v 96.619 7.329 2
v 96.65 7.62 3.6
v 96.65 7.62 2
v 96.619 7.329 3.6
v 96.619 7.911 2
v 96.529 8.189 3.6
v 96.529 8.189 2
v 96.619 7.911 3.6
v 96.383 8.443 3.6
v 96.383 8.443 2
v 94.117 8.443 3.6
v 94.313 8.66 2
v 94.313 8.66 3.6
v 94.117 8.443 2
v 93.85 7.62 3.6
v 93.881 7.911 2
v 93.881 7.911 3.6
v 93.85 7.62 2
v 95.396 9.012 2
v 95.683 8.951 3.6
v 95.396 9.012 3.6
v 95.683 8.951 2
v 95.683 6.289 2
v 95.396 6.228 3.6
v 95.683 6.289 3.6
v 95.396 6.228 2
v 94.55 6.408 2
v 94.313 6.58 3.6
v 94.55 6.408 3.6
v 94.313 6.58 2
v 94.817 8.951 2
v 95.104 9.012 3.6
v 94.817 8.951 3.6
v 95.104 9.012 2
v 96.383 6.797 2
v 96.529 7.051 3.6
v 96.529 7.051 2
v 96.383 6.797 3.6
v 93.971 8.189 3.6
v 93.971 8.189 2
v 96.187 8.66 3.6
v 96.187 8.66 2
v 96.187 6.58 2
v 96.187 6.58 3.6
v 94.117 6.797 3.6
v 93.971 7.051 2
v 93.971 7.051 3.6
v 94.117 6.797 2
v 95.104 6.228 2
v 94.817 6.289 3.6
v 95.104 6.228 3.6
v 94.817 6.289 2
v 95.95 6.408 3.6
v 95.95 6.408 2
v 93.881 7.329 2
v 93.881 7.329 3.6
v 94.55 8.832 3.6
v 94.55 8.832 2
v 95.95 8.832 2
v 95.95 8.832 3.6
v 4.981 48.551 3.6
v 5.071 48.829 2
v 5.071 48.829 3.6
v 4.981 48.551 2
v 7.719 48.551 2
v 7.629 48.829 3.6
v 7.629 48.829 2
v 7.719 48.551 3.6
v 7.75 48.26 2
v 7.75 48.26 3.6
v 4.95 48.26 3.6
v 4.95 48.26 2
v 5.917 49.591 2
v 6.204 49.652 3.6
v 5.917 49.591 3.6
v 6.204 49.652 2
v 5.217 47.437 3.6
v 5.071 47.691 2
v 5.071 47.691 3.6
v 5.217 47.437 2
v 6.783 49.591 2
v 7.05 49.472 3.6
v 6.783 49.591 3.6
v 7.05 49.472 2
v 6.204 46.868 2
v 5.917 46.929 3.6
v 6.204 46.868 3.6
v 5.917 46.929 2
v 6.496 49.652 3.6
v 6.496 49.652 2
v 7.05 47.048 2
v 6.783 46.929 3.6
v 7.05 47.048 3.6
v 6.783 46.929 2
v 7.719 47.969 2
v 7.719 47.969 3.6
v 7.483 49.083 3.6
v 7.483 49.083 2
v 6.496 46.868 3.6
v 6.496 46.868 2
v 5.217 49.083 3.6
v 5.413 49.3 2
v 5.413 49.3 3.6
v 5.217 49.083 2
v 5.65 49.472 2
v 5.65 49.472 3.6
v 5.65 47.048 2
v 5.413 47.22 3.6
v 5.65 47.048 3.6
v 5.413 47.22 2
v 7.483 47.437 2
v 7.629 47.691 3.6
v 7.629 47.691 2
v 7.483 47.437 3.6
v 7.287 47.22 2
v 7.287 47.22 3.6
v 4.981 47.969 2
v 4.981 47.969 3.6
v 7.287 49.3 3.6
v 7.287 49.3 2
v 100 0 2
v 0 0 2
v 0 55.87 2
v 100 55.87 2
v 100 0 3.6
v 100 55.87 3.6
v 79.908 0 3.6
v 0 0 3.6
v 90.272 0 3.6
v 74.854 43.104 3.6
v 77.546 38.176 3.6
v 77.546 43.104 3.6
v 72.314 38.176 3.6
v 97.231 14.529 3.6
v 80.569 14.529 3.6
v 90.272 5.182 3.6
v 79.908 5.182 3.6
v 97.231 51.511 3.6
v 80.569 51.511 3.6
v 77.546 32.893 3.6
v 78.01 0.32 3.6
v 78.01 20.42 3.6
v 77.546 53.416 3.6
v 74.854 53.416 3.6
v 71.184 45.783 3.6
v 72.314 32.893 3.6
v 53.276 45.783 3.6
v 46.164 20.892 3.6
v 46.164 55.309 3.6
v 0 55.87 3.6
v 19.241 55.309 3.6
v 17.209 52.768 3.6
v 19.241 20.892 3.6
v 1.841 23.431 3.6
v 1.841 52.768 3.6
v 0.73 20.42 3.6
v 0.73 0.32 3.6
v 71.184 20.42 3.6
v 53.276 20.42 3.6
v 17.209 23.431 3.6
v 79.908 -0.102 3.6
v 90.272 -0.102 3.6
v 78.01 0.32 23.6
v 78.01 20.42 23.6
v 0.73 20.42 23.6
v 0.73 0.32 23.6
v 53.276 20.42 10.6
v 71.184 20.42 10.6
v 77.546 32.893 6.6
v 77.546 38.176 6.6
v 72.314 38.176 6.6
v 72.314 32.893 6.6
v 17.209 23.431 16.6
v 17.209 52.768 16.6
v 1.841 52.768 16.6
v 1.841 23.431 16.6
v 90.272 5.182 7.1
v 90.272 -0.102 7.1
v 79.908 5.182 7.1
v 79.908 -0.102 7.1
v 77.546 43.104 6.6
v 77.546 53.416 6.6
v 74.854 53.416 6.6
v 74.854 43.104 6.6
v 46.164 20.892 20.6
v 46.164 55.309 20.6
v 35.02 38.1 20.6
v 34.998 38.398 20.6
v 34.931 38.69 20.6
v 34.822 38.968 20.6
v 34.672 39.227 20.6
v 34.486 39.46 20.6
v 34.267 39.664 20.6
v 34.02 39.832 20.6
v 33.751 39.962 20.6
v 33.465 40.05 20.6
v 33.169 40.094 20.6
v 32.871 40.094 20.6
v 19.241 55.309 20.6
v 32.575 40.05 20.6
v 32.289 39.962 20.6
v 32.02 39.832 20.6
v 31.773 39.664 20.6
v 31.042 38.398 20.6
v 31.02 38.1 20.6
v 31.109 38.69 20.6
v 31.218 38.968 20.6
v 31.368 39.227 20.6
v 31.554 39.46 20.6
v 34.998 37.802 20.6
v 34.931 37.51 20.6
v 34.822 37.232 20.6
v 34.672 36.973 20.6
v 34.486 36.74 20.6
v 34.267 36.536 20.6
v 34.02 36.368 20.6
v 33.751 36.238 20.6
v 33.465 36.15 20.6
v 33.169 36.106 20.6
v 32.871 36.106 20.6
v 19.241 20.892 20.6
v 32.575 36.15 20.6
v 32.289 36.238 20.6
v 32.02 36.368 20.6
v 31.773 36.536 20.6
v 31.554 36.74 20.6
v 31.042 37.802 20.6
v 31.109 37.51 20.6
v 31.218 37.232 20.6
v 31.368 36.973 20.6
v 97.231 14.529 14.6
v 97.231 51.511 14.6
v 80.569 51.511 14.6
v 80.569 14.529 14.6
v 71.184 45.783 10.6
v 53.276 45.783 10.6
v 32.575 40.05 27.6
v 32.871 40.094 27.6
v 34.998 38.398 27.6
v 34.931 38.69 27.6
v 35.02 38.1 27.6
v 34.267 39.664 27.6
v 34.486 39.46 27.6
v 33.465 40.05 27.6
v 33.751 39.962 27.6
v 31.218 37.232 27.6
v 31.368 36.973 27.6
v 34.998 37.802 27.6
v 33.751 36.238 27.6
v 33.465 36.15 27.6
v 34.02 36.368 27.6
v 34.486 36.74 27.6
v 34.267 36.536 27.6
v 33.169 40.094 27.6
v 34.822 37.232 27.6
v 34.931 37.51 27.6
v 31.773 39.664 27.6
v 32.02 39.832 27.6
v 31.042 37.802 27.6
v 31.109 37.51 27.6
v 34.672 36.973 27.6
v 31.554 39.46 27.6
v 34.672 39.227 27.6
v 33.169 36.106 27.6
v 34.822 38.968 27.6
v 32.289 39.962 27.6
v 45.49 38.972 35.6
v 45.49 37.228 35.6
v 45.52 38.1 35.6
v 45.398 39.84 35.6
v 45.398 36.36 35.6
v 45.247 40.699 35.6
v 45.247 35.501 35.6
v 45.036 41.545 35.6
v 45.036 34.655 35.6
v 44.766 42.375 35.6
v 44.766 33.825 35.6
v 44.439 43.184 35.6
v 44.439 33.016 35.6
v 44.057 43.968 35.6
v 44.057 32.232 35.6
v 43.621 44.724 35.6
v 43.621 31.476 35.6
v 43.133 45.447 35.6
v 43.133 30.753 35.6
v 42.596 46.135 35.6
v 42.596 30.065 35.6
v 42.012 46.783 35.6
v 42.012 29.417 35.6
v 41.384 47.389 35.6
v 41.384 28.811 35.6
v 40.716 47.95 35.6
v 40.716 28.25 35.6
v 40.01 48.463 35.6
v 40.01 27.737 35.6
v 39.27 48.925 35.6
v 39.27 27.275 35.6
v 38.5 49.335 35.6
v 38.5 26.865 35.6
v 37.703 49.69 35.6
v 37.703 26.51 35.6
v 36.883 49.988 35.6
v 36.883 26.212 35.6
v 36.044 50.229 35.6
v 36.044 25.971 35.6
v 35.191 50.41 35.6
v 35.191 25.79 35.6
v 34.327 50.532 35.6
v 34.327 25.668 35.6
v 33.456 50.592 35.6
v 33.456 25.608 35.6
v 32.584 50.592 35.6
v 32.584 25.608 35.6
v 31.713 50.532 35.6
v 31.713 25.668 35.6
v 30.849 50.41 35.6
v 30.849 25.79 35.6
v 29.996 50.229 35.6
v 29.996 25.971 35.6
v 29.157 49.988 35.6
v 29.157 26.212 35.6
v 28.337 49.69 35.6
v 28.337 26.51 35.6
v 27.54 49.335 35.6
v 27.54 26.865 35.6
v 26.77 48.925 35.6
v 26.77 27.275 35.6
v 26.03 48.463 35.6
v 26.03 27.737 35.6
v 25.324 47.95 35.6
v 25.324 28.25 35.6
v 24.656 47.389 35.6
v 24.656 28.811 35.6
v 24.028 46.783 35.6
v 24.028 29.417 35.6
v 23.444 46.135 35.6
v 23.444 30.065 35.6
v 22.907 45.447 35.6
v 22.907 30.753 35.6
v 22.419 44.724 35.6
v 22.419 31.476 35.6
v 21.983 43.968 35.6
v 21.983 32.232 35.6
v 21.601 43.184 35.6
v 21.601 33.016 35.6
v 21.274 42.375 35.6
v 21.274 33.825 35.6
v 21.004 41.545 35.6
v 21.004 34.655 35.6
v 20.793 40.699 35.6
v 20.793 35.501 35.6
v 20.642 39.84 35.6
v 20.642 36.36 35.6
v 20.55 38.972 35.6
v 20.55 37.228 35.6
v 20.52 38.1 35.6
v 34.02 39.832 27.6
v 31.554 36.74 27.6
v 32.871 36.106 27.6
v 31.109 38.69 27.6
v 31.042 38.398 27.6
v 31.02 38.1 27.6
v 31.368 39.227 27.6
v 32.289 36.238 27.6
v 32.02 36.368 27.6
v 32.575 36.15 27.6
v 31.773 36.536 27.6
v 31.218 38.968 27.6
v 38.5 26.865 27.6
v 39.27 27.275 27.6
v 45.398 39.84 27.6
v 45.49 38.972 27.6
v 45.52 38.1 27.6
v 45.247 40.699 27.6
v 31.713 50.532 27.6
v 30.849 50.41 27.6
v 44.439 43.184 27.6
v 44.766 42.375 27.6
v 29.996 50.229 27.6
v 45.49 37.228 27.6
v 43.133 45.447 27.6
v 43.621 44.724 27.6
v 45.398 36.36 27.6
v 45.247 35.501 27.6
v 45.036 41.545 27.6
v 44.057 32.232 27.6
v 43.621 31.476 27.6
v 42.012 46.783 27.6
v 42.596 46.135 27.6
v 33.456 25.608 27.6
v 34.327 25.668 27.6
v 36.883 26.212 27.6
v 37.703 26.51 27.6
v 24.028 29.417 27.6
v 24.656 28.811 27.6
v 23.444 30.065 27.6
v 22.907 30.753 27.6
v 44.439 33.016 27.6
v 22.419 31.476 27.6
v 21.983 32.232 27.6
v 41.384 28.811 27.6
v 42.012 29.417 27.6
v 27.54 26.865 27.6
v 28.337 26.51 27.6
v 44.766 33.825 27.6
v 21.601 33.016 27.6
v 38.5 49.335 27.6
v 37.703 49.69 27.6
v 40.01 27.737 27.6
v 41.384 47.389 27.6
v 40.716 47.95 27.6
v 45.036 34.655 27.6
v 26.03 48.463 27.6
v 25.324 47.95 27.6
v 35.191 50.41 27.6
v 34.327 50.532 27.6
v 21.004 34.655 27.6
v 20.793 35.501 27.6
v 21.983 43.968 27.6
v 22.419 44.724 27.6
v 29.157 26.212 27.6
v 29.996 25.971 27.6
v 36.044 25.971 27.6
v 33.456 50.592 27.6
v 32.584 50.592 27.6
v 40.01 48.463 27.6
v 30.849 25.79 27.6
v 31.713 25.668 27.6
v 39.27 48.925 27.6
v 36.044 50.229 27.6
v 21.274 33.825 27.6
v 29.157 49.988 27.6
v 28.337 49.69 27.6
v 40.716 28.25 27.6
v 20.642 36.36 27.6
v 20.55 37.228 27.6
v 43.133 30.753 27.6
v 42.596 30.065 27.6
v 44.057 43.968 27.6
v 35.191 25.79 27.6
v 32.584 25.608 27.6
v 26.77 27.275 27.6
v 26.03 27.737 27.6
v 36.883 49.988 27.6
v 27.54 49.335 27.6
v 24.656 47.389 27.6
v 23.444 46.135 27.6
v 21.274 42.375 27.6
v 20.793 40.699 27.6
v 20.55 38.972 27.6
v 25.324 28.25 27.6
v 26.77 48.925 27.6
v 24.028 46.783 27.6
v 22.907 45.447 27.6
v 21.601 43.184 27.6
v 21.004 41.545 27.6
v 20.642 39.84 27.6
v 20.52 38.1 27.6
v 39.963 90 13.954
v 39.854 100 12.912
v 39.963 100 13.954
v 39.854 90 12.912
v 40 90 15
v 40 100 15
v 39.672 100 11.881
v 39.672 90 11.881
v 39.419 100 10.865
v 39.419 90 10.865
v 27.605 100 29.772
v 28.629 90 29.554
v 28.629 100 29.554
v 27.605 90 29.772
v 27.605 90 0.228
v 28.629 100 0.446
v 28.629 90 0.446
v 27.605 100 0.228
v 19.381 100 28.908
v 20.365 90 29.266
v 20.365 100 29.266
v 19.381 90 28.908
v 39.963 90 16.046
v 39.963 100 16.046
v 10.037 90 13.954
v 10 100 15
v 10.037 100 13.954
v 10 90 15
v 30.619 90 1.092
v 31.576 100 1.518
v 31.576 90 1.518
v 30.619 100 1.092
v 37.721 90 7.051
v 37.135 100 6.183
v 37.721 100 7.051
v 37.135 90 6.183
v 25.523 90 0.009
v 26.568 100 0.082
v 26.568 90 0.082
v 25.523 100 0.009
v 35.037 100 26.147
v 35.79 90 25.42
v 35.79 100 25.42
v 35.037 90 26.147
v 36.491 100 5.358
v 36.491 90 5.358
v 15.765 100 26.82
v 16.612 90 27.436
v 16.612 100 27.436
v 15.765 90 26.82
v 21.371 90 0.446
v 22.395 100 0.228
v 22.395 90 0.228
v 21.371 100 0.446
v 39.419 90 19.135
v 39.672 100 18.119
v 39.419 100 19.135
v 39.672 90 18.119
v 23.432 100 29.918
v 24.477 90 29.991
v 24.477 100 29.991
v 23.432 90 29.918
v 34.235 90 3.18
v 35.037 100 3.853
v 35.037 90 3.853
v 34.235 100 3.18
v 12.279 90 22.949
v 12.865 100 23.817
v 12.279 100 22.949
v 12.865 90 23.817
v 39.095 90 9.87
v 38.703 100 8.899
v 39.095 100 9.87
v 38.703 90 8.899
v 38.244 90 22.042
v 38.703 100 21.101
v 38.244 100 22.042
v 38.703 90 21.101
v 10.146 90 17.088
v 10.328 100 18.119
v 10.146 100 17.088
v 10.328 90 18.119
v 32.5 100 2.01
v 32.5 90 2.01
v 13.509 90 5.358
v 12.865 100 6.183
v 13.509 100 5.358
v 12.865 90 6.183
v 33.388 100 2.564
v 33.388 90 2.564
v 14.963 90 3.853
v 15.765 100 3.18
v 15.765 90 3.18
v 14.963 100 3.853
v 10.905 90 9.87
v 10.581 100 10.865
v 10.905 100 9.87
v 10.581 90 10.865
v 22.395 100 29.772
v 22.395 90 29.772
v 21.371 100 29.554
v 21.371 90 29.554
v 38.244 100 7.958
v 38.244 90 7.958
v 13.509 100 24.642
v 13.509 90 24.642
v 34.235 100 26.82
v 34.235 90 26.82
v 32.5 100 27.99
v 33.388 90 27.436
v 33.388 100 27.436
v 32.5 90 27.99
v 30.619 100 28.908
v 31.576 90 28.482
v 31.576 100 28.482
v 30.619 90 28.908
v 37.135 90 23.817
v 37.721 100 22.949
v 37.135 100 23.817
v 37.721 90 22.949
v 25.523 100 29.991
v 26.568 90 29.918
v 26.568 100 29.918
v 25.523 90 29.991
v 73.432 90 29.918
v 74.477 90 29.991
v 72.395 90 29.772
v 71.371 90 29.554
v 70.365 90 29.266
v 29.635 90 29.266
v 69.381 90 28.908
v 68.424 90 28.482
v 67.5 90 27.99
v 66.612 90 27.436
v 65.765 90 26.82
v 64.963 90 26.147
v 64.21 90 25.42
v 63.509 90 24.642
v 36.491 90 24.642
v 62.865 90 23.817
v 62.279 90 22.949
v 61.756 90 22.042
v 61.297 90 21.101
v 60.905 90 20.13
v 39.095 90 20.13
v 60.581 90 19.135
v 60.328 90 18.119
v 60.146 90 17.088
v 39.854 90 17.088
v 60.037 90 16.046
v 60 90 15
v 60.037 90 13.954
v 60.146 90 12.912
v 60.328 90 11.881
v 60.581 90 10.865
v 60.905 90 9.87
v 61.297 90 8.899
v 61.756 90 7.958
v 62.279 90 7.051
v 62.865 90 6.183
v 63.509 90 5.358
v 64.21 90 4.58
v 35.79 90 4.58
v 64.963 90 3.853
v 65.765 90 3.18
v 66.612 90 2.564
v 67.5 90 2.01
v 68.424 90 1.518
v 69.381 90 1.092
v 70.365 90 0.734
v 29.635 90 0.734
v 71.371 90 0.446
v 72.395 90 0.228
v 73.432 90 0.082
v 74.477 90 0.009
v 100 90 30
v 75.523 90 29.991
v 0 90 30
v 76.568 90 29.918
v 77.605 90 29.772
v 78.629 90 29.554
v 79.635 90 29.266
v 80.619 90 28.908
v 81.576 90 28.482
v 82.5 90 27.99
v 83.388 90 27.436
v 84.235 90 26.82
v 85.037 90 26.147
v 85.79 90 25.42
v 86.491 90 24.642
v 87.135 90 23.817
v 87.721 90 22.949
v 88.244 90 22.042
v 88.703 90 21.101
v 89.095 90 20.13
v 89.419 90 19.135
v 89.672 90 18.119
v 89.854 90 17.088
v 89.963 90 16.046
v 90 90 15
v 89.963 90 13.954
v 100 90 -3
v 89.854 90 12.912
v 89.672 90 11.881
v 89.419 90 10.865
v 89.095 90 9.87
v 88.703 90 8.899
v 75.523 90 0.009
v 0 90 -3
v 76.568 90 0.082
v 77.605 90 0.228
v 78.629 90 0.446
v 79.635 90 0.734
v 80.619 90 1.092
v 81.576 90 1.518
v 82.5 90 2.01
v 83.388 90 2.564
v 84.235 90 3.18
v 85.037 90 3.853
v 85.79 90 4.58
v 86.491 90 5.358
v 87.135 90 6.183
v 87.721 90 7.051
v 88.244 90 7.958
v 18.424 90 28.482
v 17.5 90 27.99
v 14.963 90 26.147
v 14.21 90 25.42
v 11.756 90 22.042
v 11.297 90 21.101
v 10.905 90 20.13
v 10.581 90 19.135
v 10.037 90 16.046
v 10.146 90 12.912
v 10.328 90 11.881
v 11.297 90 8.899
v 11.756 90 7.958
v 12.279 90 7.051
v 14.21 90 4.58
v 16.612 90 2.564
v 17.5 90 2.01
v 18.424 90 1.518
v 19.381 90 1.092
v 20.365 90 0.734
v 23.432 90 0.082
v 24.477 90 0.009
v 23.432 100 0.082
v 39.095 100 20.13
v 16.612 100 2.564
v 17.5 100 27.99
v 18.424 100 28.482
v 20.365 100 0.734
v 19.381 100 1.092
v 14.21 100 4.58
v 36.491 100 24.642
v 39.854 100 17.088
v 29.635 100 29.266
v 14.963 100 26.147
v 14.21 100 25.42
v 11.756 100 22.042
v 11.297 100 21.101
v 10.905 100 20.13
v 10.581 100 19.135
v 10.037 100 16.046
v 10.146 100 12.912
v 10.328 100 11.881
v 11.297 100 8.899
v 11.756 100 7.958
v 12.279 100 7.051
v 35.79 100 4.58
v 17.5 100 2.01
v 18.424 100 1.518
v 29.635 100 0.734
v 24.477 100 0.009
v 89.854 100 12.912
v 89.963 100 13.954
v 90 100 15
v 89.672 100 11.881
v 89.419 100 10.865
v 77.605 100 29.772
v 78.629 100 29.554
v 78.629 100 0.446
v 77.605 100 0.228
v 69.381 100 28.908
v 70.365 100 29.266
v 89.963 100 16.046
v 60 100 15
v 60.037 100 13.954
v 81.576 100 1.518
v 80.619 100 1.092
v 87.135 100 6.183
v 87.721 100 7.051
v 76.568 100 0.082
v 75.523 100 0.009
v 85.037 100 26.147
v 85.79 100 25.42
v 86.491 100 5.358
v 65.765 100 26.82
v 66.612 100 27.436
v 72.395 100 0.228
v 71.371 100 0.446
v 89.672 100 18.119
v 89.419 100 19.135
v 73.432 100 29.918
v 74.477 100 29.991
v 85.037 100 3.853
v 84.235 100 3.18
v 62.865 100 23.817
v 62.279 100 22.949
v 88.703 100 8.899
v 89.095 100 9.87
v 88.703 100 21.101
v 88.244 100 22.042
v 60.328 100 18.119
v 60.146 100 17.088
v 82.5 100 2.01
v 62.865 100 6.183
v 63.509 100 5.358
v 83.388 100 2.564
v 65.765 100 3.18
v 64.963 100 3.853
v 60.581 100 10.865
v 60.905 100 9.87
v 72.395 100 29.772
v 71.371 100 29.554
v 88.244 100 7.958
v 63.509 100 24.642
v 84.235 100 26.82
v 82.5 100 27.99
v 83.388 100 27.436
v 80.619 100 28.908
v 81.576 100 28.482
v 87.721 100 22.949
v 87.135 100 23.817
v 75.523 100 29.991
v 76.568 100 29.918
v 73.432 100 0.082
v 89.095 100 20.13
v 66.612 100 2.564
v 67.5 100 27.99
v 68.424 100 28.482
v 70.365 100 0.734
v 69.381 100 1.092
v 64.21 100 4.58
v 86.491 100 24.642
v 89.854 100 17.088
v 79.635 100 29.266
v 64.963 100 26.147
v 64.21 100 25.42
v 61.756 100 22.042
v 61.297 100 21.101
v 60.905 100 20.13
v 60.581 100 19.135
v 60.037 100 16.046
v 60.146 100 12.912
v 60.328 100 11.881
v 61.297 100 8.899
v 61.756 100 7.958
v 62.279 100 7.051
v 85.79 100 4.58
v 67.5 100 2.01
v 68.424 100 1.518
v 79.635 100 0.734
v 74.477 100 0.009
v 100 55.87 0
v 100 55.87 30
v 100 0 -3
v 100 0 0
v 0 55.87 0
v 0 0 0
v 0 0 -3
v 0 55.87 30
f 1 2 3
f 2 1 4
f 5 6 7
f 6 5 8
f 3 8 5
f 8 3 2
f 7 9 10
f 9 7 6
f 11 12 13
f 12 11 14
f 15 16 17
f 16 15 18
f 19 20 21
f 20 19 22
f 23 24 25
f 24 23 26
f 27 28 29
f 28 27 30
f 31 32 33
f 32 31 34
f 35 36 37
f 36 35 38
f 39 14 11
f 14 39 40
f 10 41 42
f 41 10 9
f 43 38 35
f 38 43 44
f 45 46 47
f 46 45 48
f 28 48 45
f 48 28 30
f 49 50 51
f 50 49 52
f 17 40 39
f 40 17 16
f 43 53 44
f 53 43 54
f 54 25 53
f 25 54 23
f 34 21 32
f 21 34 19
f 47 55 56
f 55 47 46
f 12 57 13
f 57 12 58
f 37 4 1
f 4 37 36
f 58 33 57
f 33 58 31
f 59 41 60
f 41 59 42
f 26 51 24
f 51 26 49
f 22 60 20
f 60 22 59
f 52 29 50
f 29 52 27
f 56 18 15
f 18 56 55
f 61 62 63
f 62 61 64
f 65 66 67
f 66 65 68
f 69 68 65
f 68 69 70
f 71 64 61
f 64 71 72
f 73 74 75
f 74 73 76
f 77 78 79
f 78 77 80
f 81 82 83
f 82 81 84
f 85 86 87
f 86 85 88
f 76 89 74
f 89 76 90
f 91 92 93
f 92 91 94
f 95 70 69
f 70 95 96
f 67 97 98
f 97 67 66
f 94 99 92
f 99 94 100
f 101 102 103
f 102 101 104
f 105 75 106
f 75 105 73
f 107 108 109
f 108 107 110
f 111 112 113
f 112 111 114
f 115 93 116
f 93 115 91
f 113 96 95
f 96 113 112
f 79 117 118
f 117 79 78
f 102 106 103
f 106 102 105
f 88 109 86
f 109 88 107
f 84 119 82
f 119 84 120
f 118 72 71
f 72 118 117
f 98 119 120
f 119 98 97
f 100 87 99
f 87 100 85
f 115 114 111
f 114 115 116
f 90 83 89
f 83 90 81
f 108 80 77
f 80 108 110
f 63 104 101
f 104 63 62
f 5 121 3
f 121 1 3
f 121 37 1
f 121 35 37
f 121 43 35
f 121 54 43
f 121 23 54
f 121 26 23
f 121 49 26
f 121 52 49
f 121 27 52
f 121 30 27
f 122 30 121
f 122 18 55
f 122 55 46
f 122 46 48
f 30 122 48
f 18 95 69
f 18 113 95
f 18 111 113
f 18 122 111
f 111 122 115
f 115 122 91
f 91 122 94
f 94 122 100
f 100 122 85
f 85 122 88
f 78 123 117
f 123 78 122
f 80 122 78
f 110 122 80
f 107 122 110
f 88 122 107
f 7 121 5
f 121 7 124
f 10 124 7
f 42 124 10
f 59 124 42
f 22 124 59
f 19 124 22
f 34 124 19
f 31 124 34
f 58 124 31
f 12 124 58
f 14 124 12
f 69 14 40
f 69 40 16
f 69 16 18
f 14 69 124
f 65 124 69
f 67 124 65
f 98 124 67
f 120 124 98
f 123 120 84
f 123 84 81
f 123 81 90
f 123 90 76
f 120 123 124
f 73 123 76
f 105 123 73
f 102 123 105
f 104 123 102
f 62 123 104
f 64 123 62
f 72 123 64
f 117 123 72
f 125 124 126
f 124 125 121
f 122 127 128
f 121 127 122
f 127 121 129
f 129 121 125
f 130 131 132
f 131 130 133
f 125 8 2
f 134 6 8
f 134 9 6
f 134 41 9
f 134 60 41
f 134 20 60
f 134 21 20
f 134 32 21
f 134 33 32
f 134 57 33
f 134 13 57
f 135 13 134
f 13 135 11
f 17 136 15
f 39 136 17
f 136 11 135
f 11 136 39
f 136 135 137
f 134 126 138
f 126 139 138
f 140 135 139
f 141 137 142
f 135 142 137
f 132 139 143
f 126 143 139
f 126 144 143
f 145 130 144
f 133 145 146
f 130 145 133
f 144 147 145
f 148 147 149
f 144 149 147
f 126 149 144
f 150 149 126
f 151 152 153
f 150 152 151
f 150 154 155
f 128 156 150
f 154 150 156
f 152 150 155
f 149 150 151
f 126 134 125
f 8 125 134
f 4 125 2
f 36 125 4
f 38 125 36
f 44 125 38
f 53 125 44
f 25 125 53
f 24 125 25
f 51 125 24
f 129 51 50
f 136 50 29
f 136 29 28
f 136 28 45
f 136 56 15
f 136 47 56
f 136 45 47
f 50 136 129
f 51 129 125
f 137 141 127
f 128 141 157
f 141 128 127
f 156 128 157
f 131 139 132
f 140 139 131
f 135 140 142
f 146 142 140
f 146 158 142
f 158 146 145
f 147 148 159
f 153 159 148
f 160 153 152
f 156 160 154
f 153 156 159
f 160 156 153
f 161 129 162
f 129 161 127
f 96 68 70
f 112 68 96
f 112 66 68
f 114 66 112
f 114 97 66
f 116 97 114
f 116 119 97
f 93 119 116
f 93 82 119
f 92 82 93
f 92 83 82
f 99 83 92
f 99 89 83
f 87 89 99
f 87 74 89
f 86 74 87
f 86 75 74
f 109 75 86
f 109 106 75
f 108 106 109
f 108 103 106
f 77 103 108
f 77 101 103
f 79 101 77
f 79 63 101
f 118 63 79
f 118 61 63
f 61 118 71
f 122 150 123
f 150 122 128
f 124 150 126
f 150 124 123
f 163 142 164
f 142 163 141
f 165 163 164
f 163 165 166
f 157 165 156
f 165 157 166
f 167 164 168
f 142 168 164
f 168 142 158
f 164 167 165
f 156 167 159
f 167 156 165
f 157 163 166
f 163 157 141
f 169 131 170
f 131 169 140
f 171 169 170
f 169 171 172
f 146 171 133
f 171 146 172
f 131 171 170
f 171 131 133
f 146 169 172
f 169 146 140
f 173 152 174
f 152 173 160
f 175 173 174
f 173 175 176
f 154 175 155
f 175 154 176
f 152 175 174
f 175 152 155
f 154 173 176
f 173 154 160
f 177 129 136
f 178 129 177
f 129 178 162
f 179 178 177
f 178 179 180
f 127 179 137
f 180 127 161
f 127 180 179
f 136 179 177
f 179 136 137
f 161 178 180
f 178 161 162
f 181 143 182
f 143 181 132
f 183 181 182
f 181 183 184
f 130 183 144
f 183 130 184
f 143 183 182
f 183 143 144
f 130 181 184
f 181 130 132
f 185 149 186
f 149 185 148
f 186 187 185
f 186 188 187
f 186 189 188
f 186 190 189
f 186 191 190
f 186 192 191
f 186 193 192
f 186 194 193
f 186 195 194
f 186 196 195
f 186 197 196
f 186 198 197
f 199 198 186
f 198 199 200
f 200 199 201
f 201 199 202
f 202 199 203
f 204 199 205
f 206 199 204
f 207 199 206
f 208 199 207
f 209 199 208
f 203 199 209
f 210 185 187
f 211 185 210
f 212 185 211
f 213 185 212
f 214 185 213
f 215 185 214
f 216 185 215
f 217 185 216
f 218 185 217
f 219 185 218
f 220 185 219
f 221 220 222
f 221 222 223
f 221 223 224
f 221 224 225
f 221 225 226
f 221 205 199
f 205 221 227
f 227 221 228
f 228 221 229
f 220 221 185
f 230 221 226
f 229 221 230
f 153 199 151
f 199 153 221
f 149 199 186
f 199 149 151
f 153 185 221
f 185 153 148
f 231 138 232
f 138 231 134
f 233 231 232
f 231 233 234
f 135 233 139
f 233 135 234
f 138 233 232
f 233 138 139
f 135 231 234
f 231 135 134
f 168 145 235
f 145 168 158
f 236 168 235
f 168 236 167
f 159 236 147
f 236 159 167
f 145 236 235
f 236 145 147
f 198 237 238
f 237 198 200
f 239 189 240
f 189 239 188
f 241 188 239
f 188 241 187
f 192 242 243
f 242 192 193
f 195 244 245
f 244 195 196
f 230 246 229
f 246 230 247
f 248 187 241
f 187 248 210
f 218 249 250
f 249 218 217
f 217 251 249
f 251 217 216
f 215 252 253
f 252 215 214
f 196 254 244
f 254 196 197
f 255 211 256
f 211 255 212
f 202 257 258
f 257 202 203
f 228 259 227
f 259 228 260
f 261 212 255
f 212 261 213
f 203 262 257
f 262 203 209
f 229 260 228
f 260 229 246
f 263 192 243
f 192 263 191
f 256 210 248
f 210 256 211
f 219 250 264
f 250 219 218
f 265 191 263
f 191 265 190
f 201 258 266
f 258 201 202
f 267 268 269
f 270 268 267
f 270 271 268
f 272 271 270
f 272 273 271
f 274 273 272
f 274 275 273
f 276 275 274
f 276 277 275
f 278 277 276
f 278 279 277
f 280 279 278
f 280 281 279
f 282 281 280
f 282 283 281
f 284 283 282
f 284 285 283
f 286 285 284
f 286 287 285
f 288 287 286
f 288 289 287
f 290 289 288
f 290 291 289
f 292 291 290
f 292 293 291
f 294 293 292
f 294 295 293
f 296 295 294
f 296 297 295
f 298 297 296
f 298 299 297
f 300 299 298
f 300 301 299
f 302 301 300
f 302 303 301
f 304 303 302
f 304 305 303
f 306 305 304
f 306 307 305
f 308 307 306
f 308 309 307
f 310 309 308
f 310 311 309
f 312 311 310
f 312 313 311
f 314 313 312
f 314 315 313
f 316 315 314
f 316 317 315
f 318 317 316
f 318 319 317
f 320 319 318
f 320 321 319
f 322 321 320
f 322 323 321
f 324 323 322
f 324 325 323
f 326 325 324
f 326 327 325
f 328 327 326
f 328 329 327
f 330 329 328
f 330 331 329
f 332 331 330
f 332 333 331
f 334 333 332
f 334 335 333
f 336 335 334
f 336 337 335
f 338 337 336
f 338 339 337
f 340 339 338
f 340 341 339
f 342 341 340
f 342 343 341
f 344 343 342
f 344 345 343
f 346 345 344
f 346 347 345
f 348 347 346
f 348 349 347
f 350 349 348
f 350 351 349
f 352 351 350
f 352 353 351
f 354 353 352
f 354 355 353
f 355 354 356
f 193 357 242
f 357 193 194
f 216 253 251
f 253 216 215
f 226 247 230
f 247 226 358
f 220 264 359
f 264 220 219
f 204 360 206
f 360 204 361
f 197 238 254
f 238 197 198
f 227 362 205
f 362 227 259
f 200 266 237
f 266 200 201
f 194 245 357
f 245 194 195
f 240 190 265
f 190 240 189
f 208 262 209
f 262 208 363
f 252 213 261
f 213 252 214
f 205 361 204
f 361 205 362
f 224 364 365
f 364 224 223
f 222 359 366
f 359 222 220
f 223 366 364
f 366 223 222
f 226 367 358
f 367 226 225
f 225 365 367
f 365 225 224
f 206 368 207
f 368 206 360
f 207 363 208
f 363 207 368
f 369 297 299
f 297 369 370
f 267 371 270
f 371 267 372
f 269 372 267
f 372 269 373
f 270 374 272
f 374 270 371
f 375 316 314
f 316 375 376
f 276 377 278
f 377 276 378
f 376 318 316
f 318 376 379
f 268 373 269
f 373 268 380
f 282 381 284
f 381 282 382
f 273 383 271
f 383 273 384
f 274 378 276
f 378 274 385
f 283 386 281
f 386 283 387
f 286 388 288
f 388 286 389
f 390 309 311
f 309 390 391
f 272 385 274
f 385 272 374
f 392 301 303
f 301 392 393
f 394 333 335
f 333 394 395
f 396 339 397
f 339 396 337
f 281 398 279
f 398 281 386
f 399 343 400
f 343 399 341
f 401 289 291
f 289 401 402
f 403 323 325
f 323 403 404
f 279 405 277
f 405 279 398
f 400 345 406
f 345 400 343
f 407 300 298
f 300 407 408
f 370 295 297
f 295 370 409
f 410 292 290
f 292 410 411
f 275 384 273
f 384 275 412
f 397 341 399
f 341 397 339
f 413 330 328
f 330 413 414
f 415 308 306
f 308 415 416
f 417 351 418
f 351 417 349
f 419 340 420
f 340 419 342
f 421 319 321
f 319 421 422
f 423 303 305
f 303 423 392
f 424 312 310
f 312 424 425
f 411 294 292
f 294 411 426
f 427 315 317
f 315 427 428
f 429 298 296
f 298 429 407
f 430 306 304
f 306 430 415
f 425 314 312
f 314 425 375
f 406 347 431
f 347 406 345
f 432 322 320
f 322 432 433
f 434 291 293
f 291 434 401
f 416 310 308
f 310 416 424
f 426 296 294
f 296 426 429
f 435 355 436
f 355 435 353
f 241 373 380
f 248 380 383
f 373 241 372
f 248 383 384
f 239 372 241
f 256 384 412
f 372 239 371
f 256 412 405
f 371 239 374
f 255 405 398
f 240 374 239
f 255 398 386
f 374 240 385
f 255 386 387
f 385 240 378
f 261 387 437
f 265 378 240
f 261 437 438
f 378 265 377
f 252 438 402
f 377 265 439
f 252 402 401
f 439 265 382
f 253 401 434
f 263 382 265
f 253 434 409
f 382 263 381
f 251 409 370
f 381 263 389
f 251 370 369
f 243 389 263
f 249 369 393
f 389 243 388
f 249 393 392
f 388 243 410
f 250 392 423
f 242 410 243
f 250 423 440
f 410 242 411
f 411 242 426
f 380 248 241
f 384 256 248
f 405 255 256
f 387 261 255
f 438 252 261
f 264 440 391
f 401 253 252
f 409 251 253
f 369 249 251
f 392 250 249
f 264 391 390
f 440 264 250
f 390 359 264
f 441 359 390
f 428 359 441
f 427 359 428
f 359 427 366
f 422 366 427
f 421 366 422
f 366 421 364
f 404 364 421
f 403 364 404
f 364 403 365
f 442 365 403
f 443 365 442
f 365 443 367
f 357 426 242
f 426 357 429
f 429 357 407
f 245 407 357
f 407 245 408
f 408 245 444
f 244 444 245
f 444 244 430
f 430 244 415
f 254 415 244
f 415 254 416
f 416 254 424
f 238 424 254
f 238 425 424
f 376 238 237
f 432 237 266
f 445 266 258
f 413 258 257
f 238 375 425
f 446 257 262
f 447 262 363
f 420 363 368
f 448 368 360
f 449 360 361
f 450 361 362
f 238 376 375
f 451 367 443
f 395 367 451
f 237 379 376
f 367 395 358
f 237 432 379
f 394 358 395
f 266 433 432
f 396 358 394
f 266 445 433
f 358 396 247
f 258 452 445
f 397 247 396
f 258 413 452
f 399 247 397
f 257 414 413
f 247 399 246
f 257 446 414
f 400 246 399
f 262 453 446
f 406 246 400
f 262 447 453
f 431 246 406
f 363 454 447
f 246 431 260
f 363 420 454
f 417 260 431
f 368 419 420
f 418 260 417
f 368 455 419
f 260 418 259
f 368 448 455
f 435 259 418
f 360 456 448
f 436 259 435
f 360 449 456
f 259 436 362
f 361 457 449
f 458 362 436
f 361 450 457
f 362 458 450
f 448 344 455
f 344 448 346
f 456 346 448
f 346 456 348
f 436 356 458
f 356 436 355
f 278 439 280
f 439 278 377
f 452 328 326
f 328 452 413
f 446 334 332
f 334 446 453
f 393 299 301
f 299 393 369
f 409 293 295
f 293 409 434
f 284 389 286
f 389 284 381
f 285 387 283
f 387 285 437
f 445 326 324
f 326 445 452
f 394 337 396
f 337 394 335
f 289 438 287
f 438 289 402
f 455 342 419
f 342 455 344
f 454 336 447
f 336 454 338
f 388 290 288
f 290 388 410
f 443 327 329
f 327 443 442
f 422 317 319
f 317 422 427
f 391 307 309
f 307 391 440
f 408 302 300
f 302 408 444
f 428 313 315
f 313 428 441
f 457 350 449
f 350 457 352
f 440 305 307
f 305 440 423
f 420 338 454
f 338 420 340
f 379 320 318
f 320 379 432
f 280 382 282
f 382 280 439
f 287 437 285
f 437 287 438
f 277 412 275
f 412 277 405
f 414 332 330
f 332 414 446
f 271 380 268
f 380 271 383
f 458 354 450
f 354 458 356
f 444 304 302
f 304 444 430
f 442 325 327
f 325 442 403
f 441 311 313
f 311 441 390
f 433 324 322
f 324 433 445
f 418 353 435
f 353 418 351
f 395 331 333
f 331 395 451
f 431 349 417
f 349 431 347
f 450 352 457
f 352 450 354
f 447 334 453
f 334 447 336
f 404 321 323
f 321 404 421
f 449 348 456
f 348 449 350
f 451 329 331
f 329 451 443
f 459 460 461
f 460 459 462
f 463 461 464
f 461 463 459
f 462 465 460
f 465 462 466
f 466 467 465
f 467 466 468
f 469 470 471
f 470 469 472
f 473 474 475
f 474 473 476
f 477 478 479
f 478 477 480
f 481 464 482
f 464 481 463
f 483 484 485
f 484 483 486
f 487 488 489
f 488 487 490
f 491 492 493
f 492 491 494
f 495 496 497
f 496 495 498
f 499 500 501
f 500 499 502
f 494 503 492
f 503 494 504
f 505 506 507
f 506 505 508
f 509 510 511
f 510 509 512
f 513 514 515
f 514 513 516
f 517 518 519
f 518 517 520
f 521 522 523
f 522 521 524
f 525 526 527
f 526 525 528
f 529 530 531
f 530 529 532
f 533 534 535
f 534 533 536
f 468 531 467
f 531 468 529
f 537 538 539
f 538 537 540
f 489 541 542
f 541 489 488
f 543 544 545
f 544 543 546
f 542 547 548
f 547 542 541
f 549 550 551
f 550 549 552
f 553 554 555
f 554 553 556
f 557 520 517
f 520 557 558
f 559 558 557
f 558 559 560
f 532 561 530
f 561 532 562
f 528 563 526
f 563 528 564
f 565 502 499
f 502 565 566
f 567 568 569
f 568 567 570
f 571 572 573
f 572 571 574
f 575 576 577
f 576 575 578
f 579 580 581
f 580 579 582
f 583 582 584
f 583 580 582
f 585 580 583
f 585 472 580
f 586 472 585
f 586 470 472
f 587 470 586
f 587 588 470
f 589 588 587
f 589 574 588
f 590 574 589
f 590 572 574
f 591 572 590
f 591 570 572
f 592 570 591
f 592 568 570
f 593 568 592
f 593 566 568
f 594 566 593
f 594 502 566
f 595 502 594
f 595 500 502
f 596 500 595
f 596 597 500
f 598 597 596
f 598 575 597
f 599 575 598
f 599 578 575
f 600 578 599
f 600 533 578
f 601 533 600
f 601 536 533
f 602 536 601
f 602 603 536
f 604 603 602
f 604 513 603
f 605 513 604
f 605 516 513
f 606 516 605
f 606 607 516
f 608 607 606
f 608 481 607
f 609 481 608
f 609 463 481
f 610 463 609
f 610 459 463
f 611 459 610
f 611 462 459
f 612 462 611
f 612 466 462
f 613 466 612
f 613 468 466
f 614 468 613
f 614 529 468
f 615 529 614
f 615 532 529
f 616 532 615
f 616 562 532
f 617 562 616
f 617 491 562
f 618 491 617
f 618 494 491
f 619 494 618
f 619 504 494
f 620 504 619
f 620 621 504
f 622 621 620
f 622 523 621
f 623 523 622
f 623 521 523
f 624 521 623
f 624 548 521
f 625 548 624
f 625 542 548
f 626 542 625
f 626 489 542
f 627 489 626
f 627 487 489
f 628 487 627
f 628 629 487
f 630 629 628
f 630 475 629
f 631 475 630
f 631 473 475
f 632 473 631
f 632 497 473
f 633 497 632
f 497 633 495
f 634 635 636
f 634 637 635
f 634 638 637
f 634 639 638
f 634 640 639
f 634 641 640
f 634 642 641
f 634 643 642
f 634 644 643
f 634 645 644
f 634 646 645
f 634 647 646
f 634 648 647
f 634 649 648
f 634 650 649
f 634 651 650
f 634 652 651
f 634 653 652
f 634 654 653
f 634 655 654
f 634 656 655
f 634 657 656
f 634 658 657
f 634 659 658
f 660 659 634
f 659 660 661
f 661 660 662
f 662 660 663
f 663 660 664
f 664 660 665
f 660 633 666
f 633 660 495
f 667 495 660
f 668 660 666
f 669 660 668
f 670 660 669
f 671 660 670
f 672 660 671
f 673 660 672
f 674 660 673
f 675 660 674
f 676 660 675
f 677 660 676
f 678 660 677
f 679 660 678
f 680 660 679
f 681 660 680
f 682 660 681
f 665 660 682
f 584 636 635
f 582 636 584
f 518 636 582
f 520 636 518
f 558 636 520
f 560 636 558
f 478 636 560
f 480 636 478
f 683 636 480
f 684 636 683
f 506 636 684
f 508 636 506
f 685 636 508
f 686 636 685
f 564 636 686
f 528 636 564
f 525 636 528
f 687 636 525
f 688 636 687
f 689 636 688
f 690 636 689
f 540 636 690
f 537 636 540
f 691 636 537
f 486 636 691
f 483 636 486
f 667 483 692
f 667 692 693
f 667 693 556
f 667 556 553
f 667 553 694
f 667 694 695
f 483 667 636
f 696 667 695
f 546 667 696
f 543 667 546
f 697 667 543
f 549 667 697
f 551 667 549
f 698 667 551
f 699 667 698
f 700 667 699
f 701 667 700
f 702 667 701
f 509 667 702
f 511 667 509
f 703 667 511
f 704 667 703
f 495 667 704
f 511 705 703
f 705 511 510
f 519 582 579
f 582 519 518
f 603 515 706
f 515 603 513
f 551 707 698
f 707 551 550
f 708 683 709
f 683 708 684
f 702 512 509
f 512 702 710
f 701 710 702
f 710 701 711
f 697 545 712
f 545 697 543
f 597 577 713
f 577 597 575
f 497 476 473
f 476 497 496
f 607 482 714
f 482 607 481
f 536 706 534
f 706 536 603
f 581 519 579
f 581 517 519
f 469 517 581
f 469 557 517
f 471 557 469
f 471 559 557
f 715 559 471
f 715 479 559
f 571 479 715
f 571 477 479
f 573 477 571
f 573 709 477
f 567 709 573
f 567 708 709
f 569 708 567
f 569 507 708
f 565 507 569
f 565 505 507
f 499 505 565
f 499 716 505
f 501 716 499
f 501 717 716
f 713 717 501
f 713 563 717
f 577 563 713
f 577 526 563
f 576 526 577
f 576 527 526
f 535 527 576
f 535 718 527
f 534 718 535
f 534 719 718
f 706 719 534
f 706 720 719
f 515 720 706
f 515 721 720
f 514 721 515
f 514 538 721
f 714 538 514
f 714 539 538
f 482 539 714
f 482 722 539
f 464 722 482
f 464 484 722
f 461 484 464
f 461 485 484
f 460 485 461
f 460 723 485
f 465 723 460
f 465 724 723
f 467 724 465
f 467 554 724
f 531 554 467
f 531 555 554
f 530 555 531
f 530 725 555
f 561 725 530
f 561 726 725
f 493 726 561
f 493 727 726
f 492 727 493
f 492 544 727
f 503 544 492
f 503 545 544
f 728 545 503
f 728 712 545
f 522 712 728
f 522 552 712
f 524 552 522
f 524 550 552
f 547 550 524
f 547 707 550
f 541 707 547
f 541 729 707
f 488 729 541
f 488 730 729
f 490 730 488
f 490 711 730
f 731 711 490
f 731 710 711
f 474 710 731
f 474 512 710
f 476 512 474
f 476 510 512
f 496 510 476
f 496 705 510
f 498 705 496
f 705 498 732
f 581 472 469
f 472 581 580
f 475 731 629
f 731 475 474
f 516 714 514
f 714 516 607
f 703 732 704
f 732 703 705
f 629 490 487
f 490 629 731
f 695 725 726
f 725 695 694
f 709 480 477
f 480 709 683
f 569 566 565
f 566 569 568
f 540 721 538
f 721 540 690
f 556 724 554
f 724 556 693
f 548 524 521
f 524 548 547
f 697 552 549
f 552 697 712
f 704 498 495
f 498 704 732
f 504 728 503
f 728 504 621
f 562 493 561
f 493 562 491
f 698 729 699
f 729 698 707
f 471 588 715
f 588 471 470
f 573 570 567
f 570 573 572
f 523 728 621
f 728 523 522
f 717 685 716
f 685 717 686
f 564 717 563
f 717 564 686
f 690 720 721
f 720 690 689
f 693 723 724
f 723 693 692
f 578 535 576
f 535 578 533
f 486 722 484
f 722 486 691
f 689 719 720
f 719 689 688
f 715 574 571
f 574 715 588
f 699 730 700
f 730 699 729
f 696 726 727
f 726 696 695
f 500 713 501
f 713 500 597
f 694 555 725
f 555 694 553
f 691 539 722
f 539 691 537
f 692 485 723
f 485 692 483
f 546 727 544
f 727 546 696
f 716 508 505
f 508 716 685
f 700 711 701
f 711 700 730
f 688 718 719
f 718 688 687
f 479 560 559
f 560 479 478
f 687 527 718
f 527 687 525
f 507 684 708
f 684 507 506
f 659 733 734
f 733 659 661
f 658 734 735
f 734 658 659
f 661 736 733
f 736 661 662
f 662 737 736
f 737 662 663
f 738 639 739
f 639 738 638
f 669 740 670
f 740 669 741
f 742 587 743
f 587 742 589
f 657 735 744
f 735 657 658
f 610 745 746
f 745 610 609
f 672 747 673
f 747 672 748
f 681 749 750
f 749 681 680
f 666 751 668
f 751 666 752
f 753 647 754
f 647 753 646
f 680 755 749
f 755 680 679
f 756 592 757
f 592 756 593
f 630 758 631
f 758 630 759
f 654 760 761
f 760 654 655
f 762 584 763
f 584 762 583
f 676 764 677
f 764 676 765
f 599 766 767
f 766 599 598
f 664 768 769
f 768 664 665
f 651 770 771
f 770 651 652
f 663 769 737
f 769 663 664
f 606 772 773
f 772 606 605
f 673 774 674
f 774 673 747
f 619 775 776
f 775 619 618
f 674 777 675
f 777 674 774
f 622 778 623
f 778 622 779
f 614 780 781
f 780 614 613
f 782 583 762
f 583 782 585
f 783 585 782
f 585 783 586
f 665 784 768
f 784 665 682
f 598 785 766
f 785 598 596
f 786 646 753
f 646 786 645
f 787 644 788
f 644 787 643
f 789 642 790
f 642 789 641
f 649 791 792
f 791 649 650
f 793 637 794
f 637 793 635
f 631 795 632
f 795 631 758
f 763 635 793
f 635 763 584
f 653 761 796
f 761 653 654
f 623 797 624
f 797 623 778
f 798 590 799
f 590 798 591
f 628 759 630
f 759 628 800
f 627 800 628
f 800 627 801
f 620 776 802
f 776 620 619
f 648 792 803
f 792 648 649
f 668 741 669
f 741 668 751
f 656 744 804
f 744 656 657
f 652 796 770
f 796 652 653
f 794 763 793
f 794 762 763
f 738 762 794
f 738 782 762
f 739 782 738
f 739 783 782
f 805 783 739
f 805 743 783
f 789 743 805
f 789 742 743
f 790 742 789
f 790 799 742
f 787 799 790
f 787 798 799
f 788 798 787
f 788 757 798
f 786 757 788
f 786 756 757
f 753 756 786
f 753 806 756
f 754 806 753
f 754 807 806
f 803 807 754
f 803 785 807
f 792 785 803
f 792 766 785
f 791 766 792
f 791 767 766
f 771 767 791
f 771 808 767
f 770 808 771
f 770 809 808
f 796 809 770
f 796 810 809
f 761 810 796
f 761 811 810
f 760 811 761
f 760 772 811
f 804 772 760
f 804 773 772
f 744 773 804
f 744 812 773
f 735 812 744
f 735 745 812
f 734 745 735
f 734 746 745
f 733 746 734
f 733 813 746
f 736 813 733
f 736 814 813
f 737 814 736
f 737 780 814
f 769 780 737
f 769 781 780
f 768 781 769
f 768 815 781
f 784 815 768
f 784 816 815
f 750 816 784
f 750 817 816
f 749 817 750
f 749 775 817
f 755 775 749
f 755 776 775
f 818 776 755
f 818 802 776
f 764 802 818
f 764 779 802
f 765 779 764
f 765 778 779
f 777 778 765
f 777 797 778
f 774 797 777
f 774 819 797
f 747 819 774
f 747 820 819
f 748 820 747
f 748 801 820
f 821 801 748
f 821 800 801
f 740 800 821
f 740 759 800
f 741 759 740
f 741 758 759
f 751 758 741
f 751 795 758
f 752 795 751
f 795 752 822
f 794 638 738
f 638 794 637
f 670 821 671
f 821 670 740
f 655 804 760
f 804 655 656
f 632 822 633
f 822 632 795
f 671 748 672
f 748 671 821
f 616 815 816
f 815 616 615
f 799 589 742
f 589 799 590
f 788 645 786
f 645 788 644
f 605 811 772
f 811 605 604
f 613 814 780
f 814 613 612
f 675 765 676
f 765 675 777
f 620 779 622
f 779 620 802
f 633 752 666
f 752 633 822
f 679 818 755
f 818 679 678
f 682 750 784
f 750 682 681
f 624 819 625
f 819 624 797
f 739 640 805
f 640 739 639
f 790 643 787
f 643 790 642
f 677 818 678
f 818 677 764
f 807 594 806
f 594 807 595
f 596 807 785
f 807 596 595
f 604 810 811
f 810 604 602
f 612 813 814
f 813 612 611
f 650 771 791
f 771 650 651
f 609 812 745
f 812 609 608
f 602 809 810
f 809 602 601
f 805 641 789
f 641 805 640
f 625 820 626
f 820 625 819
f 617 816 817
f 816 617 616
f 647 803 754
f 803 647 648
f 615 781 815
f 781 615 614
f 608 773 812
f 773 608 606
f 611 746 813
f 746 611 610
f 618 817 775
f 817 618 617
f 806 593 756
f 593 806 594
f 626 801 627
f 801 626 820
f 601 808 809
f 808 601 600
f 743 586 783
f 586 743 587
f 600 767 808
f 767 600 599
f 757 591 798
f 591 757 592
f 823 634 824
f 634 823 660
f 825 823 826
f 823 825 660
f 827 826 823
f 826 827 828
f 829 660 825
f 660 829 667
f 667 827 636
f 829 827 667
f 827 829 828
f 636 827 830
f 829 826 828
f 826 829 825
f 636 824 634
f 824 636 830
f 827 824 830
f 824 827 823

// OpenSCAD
// file: ../lib/pcb_controller.scad
// Generated by shield/tools/brd2scad.py from eagle/remote_controller.brd. Do not edit; run `make pcb`.
// Units mm. Origin = lower-left corner of the board outline. +Y = Eagle +Y.

pcb_controller_eagle_origin = [0, 0];
pcb_controller_size = [100, 55.87];
pcb_controller_outline = [[0, 0], [100, 0], [100, 55.87], [0, 55.87]];

// [name, x, y, drill]
pcb_controller_holes = [
  ["H1", 95.25, 7.62, 2.8],
  ["H2", 6.35, 48.26, 2.8],
];

// [name, package, value, x, y, rot, mirrored, [x0, y0, x1, y1] footprint box]
pcb_controller_parts = [
  ["B1", "SINGLE_18650_HOLDER", "SINGLE_18650_BATTERY_HOLDER", 39.37, 20.32, 0, false, [0.73, 0.32, 78.01, 20.42]],
  ["BATTERY", "LED5MM", "", 74.93, 35.56, 270, false, [72.314, 32.893, 77.546, 38.176]],
  ["C1", "C025-040X050", "22uF", 6.35, 40.64, 0, false, [3.861, 38.659, 8.839, 42.621]],
  ["NRF24L", "NRF24L01+", "NRF24L01+", 7.62, 36.83, 90, false, [1.841, 23.431, 17.209, 52.768]],
  ["R1", "0204/7", "10k", 85.09, 41.91, 270, false, [83.998, 37.389, 86.182, 46.431]],
  ["R2", "0204/7", "10K", 88.9, 44.45, 270, false, [87.808, 39.929, 89.992, 48.971]],
  ["R6", "0204/7", "160", 92.71, 43.18, 270, false, [91.618, 38.659, 93.802, 47.701]],
  ["S1", "TL3XPO", "TL38PO", 85.09, 2.54, 180, false, [79.908, -0.102, 90.272, 5.182]],
  ["SV1", "MA04-1", "", 76.2, 48.26, 90, false, [74.854, 43.104, 77.546, 53.416]],
  ["U$1", "JOYSTICK-2AXIS-BUTTON", "JOYSTICK-2AXIS-BUTTON", 33.02, 38.1, 90, false, [19.241, 20.892, 46.164, 55.309]],
  ["U$2", "NANO", "", 86.36, 41.91, 180, false, [80.569, 14.529, 97.231, 51.511]],
  ["U$3", "DC-DC-STEP-UP-5V", "DC-DC-STEP-UP-5V", 62.23, 33.02, 90, false, [53.276, 20.257, 71.184, 45.783]],
];
// file: ../lib/parts.scad
// Off-the-shelf part sizes and simple ghost models for previews. Units mm.
// docs/measurements.md is the source of truth for every value here, with its source
// and status. Change both together. "unverified" values are not final.

// Mounted with the long axis horizontal and the 22.3 width vertical.
// Local frame of tt_motor_ghost(): shaft on the X axis, gearbox end towards -Y.
tt_len = 64.4;
tt_w = 22.3;
tt_clip_w = 22.6;
tt_t = 18.7;
tt_shaft_from_end = 11.0;
tt_shaft_d = 5.4;
tt_shaft_len = 9.1;
tt_boss_d = 5.5;
tt_hole_d = 2.8;
// [along length from shaft, across width from shaft]
tt_holes = [[20.1, 8.85], [20.1, -8.85], [-13.4, 0]];
tt_tab_len = 5.0;
tt_tab_w = 5.7;
// Round peg on the gearbox side, estimated from the drawing scale.
tt_peg = [11.2, 0];
tt_peg_d = 4.0;
tt_top_above_axle = max(tt_w, tt_clip_w) / 2;

wheel_d = 65;
wheel_w = 26;

caster_h = 35;
caster_wheel_d = 25;
caster_hole_d = 5;
caster_hole_spacing = [28, 23];
caster_plate = [38, 32];
caster_plate_t = 2;

// Plate underside height; the caster must reach the same height. Recompute after
// measuring wheel_d, tt_top_above_axle, motor_top_gap and caster_h.
// On the prototype an aluminium angle flange sits between plate and motor (photo
// estimate). The gap also keeps the top motor nut trap clear of the plate.
motor_top_gap = 2;
plate_underside_h = wheel_d / 2 + tt_top_above_axle + motor_top_gap;
caster_spacer_h = plate_underside_h - caster_h;

led_d = 5.0;
led_flange_d = 5.8;
led_flange_h = 1.0;
led_h = 8.6;
led_lead_pitch = 2.54;

// IR receivers: [body w, body h, depth incl. lens, lens centre above body bottom,
//     outer pin spacing, pins from back face]
tsop1730 = [10.0, 12.5, 5.8, 9.2, 7.62, 1.4];
// Upgrade option only (docs/hardware-upgrades.md). Lens height and pin offset are guesses.
tsop38238 = [5.0, 6.95, 4.8, 4.5, 5.08, 1.0];
function tsop_w(t) = t[0];
function tsop_h(t) = t[1];
function tsop_depth(t) = t[2];
function tsop_lens_h(t) = t[3];
function tsop_pin_span(t) = t[4];
function tsop_pin_back(t) = t[5];

btn_hole_d = 24;
btn_bezel_d = 30;
btn_above_panel = 10;
btn_depth = 33;
btn_nut_d = 30;

switch_body = [8.6, 3.6, 3.5];
switch_lever = [2.0, 2.0, 4.0];
switch_travel = 2.0;

cell_d = 18.5;
cell_len = 65.2;

joystick_cap_top = 32;
joystick_cap_d = 25;

// Height above the PCB top per Eagle package, for previews and clearance.
pcb_part_heights = [
    ["KEYSTONE_1049_DUAL_18650_HOLDER", 20],
    ["SINGLE_18650_HOLDER", 20],
    ["NRF24L01+", 13],
    ["NANO", 11],
    ["BA56-12EWA", 8],
    ["DIL14", 7],
    ["DIL16", 7],
    ["F/CM12P", 9.5],
    ["JOYSTICK-2AXIS-BUTTON", 17],
    ["DC-DC-STEP-UP-5V", 7],
    ["TL3XPO", 3.5],
];
function pcb_part_height(package) =
    let(i = search([package], pcb_part_heights)[0])
    is_num(i) ? pcb_part_heights[i][1] : 3;

module tt_motor_ghost() {
    color("gold") {
        translate([-tt_t / 2, -tt_shaft_from_end, -tt_w / 2]) cube([tt_t, tt_len, tt_w]);
        translate([0, -tt_shaft_from_end - tt_tab_len, 0])
            cube([3, 2 * tt_tab_len, tt_tab_w], center = true);
    }
    color("white") rotate([0, 90, 0])
        cylinder(d = tt_shaft_d, h = tt_t + 2 * tt_shaft_len, center = true);
}

module wheel_ghost() {
    color("dimgray") rotate([0, 90, 0]) cylinder(d = wheel_d, h = wheel_w, center = true);
}

// Top of the mounting plate at z = 0, wheel on the ground at z = -caster_h.
module caster_ghost() {
    color("white") {
        translate([0, 0, -caster_plate_t / 2]) cube([caster_plate.x, caster_plate.y, caster_plate_t], center = true);
        translate([0, 0, -caster_h + caster_wheel_d / 2]) rotate([0, 90, 0])
            cylinder(d = caster_wheel_d, h = 10, center = true);
        translate([-8, -4, -caster_h + caster_wheel_d / 2]) cube([16, 8, caster_h - caster_wheel_d / 2]);
    }
}

// Body bottom at z = 0, lens facing +Y.
module tsop_ghost(t = tsop1730) {
    color("black") translate([-tsop_w(t) / 2, 0, 0]) cube([tsop_w(t), tsop_depth(t), tsop_h(t)]);
    color("red") translate([0, tsop_depth(t), tsop_lens_h(t)]) sphere(1);
}

// Two receivers glued back to back, as on the prototype: one lens +Y, one -Y.
module tsop_pair_ghost(t = tsop1730) {
    tsop_ghost(t);
    rotate([0, 0, 180]) tsop_ghost(t);
}

// Flange bottom at z = 0, pointing +Z.
module led_ghost() {
    color("lightblue") {
        cylinder(d = led_flange_d, h = led_flange_h);
        cylinder(d = led_d, h = led_h - led_d / 2);
        translate([0, 0, led_h - led_d / 2]) sphere(d = led_d);
    }
}

// Panel front face at z = 0, button pointing +Z.
module arcade_button_ghost() {
    color("crimson") cylinder(d = btn_bezel_d, h = btn_above_panel);
    color("gray") translate([0, 0, -btn_depth]) cylinder(d = btn_hole_d - 1, h = btn_depth);
}

// PCB from a generated pcb_*.scad table with footprint boxes as part ghosts.
// Bottom of the PCB at z = 0. Parts named in flat_parts are only wire connection
// points on this PCB (the real part sits elsewhere) and are drawn flat.
module pcb_ghost(outline, holes, parts, flat_parts = []) {
    color("darkgreen") difference() {
        linear_extrude(pcb_thickness) polygon(outline);
        for (h = holes) translate([h[1], h[2], 0]) hole(h[3], pcb_thickness, cl = 0);
    }
    for (p = parts) {
        box = p[7];
        h = is_num(search([p[0]], flat_parts)[0]) ? 0.3 : pcb_part_height(p[1]);
        color(h > 15 ? "black" : "steelblue", 0.8)
            translate([box[0], box[1], pcb_thickness]) cube([box[2] - box[0], box[3] - box[1], h]);
    }
}
// file: ../lib/common.scad
// Shared print, fastener and helper definitions. Units mm.

$fa = 4;
$fs = 0.3;

eps = 0.01;

// Added to the diameter of holes, seats and press fits. Tune after the test prints.
clearance = 0.2;
wall_min = 1.6;
layer_h = 0.2;
bed_size = [180, 180, 180];

pcb_thickness = 1.6;
base_plate_t = 3;
// Under the PCB for through-hole leads and solder. Set from the vehicle PCB, see docs/measurements.md.
pcb_standoff_h = 2;

// ISO 4032 nuts, nominal.
m25_d = 2.5;
m25_nut_af = 5.0;
m25_nut_h = 2.0;

label_font = "Liberation Sans:style=Bold";

// Vertical hole from z = 0 to z = h.
module hole(d, h, cl = clearance) {
    translate([0, 0, -eps]) cylinder(d = d + cl, h = h + 2 * eps);
}

// Hex pocket from z = 0 to z = h, two flats parallel to X.
module nut_trap(af, h, cl = clearance) {
    translate([0, 0, -eps]) rotate([0, 0, 30])
        cylinder(d = (af + cl) / cos(30), h = h + eps, $fn = 6);
}

// Hole along +Y from y = 0 to y = h with a 45 deg roof pointing +Z,
// so it prints without support when the part's +Z is up on the printer.
module teardrop(d, h, cl = clearance) {
    r = (d + cl) / 2;
    rotate([90, 0, 0]) translate([0, 0, -h - eps])
        linear_extrude(h + 2 * eps) hull() {
            circle(r);
            translate([0, r * sqrt(2) - eps]) square(2 * eps, center = true);
        }
}

// Engraved label, top face at z = 0.
module label(txt, size = 4, depth = 0.6) {
    translate([0, 0, -depth]) linear_extrude(depth + eps)
        text(txt, size = size, font = label_font, halign = "center", valign = "center");
}

// Row from the generated pcb_*.scad parts table by element name.
function pcb_part(parts, name) = parts[search([name], parts)[0]];
// main file
// Controller preview: PCB, bought parts and layout placeholders. Not a printable part.
// Every layout_* value is a placeholder for the case design, not a decision.
// Origin: PCB outline lower-left corner. z = 0: top of the case floor.
// The button block is on the +Y edge, as on the prototype (docs/photos/controller_top.jpg).

include <../lib/common.scad>
include <../lib/parts.scad>
include <../lib/pcb_controller.scad>

layout_case = [100, 90];
layout_block_h = 30;
layout_button_x = [25, 75];

block_y = pcb_controller_size.y;
pcb_top_z = pcb_standoff_h + pcb_thickness;
joystick = pcb_part(pcb_controller_parts, "U$1");

color("tan", 0.6) translate([0, 0, -base_plate_t]) cube([layout_case.x, layout_case.y, base_plate_t]);

translate([0, 0, pcb_standoff_h]) pcb_ghost(pcb_controller_outline, pcb_controller_holes, pcb_controller_parts);

color("black") translate([joystick[3], joystick[4], pcb_top_z]) {
    cylinder(d = 4, h = joystick_cap_top);
    translate([0, 0, joystick_cap_top - 8]) cylinder(d = joystick_cap_d, h = 8);
}

color("sienna", 0.35) translate([0, block_y, 0]) cube([layout_case.x, layout_case.y - block_y, layout_block_h]);

for (x = layout_button_x)
    translate([x, layout_case.y, layout_block_h / 2]) rotate([-90, 0, 0]) arcade_button_ghost();
